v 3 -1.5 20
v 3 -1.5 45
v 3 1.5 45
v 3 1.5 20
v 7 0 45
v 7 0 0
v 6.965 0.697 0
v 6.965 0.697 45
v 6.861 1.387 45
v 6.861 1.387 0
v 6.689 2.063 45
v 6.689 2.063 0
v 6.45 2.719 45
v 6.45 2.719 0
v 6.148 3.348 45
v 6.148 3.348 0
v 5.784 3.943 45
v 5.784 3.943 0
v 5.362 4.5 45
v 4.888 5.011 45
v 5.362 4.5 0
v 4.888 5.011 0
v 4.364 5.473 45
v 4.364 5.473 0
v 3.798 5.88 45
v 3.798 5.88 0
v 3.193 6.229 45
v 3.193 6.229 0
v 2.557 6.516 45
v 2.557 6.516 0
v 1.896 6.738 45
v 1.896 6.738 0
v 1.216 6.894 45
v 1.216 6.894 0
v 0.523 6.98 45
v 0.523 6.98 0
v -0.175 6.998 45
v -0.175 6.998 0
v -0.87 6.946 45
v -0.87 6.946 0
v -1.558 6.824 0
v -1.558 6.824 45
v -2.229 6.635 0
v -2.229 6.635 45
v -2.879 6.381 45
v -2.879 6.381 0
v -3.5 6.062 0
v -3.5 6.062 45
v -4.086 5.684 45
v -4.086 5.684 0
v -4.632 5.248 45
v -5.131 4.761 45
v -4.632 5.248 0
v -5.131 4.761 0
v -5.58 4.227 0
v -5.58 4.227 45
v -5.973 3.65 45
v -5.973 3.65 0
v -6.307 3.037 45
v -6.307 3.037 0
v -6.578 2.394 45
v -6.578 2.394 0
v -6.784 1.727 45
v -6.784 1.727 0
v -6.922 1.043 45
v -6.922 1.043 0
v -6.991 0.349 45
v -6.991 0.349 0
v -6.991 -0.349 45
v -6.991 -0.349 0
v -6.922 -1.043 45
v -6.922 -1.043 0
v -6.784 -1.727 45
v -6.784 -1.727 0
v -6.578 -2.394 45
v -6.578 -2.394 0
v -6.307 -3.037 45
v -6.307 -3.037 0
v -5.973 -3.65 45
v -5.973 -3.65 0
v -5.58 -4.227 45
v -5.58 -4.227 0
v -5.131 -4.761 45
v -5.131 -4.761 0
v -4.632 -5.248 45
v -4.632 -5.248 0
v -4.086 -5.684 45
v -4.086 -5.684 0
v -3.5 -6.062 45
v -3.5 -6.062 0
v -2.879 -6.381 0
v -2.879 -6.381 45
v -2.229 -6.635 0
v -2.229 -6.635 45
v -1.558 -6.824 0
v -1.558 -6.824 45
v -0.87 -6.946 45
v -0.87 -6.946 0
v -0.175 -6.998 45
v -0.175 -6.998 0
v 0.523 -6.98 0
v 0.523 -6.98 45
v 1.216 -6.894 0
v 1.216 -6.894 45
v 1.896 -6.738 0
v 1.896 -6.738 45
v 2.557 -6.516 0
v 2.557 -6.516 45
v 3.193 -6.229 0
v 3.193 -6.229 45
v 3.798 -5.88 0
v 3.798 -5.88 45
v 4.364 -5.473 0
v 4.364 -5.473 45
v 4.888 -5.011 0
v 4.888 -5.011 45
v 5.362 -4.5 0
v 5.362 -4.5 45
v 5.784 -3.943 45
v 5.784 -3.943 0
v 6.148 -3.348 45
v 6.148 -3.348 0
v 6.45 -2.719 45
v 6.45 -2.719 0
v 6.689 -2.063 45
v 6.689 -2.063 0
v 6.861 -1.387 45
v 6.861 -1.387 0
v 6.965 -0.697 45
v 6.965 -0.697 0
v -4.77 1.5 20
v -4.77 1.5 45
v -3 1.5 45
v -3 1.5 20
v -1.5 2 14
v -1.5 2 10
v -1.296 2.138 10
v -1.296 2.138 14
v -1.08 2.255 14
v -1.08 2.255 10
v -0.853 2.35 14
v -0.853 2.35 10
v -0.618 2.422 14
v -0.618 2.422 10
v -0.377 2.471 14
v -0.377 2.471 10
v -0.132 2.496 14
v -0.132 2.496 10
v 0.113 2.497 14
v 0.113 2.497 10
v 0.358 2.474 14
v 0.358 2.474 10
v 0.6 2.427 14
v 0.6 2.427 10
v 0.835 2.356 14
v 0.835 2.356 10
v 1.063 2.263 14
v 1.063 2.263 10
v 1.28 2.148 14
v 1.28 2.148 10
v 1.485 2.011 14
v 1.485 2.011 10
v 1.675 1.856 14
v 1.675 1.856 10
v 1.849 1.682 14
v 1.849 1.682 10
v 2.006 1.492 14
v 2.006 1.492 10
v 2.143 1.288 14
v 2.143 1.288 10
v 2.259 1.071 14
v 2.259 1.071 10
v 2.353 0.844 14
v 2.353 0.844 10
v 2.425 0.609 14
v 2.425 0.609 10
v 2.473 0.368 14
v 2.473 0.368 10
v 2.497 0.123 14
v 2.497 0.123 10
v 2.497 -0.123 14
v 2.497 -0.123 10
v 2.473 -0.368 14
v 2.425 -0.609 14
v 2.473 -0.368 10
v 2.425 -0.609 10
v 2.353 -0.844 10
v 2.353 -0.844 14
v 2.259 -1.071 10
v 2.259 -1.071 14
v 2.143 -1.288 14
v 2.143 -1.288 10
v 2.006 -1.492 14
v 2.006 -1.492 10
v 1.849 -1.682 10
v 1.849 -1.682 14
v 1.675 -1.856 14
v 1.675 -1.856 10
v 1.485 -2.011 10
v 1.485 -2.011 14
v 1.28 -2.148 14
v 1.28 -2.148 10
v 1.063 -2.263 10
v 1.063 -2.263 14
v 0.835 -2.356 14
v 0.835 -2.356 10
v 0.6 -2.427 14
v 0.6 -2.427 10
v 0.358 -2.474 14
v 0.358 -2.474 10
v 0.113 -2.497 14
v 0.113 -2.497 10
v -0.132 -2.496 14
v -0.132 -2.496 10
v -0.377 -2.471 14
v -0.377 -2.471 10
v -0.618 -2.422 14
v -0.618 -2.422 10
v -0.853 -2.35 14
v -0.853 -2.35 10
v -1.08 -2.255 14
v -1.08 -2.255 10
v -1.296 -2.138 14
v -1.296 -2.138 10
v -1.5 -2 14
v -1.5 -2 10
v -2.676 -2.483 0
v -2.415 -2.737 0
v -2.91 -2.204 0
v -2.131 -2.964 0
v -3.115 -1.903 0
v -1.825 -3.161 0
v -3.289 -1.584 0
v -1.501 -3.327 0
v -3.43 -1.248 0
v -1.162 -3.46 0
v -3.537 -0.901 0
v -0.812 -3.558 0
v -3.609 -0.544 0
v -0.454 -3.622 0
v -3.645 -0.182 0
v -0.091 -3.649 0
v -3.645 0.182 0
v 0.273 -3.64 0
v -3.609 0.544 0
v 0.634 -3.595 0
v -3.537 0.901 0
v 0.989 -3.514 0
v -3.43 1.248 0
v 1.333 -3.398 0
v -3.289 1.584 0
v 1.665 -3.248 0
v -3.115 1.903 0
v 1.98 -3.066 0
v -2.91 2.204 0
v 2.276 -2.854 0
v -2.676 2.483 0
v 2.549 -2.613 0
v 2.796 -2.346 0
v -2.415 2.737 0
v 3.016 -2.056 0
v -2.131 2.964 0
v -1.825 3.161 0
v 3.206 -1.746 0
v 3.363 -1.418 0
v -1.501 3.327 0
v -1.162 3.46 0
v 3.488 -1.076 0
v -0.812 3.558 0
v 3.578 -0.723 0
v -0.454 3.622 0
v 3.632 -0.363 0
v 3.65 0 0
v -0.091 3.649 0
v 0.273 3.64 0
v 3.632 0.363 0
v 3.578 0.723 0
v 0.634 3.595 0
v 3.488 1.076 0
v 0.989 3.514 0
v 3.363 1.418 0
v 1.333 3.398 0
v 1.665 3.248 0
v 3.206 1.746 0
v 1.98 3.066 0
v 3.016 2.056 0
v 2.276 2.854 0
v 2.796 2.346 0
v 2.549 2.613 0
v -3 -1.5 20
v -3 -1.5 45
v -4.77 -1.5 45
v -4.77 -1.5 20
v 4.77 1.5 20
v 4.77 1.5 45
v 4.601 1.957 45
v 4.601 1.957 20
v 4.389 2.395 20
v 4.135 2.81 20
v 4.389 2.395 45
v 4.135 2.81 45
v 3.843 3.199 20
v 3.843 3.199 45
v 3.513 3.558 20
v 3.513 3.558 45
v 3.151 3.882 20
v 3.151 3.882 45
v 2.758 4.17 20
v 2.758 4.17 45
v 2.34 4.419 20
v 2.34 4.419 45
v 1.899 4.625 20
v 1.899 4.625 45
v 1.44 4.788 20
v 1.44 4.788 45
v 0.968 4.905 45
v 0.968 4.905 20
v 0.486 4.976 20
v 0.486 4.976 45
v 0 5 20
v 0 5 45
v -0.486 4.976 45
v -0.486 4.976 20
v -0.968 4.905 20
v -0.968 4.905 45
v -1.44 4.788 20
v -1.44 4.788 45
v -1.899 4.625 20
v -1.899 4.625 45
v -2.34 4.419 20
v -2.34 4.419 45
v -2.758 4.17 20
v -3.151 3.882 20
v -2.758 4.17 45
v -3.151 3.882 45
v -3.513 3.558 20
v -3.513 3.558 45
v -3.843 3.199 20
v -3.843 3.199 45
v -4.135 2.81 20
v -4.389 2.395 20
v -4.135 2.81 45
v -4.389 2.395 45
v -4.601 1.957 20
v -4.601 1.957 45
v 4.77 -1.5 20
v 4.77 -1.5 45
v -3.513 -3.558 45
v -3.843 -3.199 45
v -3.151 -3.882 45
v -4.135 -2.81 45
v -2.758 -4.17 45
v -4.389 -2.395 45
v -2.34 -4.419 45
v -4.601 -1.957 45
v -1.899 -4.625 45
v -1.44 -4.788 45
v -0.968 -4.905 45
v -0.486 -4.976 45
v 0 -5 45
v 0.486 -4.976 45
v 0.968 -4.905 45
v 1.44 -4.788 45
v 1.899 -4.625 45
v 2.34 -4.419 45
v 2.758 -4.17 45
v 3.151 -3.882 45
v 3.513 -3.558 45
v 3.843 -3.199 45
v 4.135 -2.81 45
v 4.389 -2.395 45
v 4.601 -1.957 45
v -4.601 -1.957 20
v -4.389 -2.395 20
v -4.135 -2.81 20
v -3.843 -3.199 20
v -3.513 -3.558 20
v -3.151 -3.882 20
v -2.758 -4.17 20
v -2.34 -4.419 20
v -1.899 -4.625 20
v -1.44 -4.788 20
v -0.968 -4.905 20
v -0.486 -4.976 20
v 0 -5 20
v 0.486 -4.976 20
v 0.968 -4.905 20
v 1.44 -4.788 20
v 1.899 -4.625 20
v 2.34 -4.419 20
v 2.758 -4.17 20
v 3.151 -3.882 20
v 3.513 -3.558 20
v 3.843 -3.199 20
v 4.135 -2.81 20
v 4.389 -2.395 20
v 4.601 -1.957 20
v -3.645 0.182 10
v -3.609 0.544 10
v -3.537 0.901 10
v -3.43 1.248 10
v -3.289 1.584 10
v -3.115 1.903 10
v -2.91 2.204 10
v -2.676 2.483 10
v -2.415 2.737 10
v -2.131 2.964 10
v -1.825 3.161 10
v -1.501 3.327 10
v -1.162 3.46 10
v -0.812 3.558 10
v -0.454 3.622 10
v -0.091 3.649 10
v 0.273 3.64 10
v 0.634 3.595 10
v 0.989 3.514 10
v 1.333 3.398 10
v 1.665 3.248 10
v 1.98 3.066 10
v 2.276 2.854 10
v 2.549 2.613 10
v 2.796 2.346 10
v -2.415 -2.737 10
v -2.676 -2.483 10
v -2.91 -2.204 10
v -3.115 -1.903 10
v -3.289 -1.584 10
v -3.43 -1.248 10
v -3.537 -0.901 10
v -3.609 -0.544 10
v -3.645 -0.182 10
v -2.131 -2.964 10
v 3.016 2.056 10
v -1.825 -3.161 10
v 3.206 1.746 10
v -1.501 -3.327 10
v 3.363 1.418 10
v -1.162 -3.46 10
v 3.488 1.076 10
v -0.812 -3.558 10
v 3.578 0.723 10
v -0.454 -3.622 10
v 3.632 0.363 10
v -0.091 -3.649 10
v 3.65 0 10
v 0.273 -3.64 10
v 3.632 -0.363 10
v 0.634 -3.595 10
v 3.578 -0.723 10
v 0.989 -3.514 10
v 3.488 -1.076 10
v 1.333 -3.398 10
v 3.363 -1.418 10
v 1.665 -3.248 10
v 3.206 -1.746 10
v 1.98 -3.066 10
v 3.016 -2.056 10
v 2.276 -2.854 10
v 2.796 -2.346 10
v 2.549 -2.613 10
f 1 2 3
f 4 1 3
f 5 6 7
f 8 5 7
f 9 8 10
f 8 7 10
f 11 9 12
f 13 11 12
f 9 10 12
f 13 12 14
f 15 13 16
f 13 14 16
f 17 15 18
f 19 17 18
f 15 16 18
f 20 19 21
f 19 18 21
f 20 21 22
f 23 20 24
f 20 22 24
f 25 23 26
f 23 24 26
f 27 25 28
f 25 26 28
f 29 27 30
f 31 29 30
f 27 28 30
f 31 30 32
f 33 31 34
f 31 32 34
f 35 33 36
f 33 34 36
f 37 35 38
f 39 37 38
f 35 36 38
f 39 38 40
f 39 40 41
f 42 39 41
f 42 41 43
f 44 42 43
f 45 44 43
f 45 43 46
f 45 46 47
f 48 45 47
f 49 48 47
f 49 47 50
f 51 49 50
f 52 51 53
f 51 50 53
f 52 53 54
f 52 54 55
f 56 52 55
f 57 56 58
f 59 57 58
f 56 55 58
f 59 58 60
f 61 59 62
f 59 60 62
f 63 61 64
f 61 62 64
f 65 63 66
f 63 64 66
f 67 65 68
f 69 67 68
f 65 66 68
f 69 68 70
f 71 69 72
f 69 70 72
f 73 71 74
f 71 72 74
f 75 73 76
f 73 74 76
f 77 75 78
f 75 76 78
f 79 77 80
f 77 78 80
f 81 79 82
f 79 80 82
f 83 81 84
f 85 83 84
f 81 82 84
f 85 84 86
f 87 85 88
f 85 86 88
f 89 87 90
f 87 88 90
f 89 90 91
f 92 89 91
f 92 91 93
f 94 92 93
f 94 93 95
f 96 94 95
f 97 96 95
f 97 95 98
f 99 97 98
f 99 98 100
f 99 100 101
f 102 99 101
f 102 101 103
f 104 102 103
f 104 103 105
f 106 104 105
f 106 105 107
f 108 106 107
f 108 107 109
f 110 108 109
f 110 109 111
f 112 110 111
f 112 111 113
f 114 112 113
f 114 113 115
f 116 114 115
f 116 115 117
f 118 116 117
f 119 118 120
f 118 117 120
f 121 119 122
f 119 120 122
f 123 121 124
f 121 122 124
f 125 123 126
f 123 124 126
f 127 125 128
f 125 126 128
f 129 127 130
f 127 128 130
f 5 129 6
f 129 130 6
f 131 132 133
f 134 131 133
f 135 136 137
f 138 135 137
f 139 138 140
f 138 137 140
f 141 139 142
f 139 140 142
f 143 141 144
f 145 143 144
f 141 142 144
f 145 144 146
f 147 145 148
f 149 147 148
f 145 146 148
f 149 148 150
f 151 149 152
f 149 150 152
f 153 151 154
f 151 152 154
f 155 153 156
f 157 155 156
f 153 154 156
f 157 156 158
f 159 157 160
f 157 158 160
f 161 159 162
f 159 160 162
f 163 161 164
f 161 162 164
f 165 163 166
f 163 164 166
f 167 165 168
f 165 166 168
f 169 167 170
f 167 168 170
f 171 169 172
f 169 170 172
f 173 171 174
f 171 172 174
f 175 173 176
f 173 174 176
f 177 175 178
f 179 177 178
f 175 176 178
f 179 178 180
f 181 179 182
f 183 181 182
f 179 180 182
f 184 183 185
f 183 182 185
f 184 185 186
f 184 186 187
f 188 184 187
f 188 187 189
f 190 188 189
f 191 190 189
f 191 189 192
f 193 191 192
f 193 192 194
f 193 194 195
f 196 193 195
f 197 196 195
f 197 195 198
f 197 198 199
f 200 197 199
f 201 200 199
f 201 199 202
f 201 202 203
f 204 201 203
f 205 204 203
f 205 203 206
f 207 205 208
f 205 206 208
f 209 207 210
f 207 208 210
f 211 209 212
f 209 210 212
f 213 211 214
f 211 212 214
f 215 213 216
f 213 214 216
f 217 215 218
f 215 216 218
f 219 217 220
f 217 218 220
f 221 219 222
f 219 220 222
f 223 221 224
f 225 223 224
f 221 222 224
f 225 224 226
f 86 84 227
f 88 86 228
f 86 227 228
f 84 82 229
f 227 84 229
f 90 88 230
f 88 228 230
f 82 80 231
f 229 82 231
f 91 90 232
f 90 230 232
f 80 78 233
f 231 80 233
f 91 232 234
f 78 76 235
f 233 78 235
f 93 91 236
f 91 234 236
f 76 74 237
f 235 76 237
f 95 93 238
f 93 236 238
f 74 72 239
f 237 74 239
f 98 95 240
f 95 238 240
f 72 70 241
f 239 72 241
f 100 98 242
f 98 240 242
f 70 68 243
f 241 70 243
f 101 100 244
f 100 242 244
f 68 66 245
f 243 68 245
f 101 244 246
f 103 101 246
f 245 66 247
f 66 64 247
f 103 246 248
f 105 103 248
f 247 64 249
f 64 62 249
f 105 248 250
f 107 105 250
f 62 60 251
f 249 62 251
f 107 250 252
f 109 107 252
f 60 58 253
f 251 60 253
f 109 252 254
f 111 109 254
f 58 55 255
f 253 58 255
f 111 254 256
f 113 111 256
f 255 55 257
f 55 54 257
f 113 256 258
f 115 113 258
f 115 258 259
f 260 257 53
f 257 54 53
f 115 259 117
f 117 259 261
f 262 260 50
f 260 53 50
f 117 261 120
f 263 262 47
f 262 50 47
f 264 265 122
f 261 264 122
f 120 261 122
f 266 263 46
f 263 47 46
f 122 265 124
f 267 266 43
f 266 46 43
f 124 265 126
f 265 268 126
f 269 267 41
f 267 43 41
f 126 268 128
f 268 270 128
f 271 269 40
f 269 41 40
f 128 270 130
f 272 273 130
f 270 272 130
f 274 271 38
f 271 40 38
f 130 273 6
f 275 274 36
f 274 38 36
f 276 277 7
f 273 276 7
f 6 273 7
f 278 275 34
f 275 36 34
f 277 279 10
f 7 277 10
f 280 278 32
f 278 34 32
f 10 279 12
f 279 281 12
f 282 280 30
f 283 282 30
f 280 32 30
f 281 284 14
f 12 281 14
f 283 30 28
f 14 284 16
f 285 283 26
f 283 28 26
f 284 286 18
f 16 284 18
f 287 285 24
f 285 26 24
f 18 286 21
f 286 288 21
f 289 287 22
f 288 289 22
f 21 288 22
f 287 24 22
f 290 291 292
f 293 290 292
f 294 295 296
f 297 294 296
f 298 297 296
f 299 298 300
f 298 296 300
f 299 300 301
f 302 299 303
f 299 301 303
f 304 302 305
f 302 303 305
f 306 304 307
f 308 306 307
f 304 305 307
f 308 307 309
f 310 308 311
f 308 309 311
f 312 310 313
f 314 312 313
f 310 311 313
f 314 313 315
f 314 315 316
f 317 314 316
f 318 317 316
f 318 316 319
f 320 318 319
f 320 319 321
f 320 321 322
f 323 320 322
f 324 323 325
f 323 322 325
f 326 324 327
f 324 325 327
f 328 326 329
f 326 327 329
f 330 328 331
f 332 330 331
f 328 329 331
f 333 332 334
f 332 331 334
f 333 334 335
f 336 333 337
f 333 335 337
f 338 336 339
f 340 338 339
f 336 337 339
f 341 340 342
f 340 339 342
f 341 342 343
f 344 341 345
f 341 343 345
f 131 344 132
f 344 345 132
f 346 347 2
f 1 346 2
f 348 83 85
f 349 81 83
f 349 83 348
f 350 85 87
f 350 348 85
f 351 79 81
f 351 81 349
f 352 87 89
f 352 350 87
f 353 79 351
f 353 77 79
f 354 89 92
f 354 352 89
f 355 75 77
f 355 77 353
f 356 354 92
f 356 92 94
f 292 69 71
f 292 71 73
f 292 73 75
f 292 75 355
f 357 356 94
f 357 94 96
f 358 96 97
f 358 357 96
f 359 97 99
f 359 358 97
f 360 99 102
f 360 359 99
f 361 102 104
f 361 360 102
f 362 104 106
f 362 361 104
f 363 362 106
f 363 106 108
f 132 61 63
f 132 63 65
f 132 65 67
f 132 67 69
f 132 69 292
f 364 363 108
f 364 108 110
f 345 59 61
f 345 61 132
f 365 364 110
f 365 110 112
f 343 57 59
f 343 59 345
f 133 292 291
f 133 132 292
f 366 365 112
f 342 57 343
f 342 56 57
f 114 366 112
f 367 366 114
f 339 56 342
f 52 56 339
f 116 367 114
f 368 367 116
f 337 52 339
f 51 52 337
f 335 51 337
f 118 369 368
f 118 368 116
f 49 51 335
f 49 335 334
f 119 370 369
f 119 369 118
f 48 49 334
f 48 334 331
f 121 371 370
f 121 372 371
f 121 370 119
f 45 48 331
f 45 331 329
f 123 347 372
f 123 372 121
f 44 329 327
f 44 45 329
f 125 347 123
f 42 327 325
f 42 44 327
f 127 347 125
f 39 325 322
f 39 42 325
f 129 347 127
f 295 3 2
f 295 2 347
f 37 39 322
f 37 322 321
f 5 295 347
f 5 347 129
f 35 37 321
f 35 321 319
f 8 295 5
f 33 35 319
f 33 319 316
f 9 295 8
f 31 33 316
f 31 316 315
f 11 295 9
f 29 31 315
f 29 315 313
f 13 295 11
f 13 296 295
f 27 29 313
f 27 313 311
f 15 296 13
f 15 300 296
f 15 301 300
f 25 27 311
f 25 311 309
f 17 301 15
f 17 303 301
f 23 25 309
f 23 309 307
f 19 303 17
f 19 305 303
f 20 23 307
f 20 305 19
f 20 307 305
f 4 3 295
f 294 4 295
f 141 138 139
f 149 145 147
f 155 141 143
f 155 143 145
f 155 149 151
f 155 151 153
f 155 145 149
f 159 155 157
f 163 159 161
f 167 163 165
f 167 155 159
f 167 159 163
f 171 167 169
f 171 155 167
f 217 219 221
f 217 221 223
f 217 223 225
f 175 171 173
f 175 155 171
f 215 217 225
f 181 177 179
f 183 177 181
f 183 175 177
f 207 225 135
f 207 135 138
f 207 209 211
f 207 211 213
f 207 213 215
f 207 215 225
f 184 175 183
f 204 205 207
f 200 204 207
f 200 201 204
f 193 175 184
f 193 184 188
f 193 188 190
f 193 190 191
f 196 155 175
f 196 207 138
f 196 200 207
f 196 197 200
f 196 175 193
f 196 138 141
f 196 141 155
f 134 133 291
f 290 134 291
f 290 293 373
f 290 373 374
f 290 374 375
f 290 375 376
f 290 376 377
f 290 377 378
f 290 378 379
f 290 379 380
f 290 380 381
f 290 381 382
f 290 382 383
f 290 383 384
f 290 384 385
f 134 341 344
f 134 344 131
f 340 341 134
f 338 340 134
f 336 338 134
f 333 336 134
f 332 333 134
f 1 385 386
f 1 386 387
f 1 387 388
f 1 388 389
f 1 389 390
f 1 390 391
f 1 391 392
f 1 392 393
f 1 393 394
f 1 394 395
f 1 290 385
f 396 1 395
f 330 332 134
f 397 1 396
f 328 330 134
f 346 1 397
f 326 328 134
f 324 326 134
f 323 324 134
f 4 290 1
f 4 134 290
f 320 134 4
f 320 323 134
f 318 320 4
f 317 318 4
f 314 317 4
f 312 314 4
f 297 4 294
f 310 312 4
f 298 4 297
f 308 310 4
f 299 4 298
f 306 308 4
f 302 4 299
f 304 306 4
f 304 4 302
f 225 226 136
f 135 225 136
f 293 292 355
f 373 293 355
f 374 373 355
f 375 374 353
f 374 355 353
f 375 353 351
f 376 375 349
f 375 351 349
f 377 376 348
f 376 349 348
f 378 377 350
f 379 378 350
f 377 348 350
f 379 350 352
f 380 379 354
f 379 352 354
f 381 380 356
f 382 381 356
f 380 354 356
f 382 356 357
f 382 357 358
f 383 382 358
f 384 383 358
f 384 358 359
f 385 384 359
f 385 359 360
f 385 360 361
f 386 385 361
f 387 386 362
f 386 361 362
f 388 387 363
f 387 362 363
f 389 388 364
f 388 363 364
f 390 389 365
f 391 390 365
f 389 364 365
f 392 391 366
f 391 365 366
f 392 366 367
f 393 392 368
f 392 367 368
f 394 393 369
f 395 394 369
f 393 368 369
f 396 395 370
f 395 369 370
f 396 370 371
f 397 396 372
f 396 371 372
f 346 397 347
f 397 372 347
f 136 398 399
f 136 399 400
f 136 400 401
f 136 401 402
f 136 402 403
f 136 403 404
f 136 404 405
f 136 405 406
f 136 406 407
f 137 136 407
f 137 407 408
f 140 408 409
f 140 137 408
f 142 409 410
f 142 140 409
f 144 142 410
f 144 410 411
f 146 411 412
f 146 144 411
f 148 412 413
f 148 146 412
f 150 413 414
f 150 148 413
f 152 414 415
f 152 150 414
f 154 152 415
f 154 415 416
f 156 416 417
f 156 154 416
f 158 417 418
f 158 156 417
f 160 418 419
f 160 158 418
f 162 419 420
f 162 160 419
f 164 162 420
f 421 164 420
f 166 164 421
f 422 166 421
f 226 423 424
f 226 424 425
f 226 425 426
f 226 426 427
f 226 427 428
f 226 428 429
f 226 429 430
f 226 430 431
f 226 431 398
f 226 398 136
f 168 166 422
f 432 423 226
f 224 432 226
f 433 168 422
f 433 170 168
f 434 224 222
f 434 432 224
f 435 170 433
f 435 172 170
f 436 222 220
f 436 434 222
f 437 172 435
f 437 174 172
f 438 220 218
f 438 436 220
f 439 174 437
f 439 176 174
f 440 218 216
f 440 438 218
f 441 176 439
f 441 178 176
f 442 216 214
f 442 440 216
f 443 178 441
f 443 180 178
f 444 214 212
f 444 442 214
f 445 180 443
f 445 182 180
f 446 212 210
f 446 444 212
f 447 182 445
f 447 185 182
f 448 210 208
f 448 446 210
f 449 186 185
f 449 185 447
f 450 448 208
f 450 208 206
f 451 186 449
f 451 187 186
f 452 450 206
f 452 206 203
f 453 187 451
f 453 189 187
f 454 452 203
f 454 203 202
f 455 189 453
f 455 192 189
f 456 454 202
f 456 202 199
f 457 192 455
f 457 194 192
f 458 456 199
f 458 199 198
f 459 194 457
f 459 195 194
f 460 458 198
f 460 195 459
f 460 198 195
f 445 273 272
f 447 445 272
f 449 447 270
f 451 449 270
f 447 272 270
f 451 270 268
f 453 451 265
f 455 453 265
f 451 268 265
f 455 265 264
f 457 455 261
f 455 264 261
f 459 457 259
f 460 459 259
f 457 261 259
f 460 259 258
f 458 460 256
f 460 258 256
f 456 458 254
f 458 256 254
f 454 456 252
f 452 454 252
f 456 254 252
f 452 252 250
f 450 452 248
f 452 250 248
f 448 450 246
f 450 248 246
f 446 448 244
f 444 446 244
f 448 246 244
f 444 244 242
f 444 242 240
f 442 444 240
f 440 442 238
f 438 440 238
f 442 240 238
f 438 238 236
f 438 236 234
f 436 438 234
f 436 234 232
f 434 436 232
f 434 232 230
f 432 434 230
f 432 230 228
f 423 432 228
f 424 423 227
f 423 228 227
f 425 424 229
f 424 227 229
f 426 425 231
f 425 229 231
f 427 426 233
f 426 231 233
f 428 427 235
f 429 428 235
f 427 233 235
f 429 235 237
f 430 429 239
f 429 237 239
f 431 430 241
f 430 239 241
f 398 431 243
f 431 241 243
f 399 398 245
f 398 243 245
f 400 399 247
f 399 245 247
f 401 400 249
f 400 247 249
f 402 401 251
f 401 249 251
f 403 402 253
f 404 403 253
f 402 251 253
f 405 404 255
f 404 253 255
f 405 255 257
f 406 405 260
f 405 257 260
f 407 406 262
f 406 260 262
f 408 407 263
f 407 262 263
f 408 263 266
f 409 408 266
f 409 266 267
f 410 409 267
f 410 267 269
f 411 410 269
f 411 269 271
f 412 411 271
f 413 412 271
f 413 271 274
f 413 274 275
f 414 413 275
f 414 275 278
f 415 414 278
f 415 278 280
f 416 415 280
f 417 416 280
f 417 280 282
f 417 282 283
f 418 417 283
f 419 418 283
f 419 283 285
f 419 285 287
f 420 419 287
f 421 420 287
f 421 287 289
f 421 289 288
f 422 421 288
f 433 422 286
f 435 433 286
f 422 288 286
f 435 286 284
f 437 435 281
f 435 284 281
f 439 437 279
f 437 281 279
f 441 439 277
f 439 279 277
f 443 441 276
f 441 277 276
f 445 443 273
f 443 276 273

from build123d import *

# Parameters (mm, degrees)
F0_R     = 7
F1_DEPTH = 45
F3_DEPTH = 25
F4_R     = 3.65
F5_DEPTH = 10
F7_DEPTH = 4


with BuildPart() as f1:
    # F0 (on Top) → F1 (new body)
    with BuildSketch(Plane.XY):
        Circle(F0_R)
    extrude(amount=F1_DEPTH)

    # F2 (on face) → F3 (cut)
    with BuildSketch(Plane.XY.offset(45)):
        with BuildLine():
            ThreePointArc((4.769696, 1.5), (0, 5), (-4.769696, 1.5))
            Line((-4.769696, 1.5), (-3, 1.5))
            Line((-3, 1.5), (-3, -1.5))
            Line((-3, -1.5), (-4.769696, -1.5))
            ThreePointArc((-4.769696, -1.5), (0, -5), (4.769696, -1.5))
            Line((4.769696, -1.5), (3, -1.5))
            Line((3, -1.5), (3, 1.5))
            Line((3, 1.5), (4.769696, 1.5))
        make_face()
    extrude(amount=-F3_DEPTH, mode=Mode.SUBTRACT)

    # F4 (on face) → F5 (cut)
    with BuildSketch(Plane(origin=(0, 0, 0), x_dir=(1, 0, 0), z_dir=(0, 0, -1))):
        Circle(F4_R)
    extrude(amount=-F5_DEPTH, mode=Mode.SUBTRACT)

    # F6 (on face) → F7 (cut)
    with BuildSketch(Plane(origin=(0, 0, 10), x_dir=(1, 0, 0), z_dir=(0, 0, -1))):
        with BuildLine():
            Line((-1.5, 2), (-1.5, -2))
            ThreePointArc((-1.5, -2), (2.5, 0), (-1.5, 2))
        make_face()
    extrude(amount=-F7_DEPTH, mode=Mode.SUBTRACT)


solid = f1.part
